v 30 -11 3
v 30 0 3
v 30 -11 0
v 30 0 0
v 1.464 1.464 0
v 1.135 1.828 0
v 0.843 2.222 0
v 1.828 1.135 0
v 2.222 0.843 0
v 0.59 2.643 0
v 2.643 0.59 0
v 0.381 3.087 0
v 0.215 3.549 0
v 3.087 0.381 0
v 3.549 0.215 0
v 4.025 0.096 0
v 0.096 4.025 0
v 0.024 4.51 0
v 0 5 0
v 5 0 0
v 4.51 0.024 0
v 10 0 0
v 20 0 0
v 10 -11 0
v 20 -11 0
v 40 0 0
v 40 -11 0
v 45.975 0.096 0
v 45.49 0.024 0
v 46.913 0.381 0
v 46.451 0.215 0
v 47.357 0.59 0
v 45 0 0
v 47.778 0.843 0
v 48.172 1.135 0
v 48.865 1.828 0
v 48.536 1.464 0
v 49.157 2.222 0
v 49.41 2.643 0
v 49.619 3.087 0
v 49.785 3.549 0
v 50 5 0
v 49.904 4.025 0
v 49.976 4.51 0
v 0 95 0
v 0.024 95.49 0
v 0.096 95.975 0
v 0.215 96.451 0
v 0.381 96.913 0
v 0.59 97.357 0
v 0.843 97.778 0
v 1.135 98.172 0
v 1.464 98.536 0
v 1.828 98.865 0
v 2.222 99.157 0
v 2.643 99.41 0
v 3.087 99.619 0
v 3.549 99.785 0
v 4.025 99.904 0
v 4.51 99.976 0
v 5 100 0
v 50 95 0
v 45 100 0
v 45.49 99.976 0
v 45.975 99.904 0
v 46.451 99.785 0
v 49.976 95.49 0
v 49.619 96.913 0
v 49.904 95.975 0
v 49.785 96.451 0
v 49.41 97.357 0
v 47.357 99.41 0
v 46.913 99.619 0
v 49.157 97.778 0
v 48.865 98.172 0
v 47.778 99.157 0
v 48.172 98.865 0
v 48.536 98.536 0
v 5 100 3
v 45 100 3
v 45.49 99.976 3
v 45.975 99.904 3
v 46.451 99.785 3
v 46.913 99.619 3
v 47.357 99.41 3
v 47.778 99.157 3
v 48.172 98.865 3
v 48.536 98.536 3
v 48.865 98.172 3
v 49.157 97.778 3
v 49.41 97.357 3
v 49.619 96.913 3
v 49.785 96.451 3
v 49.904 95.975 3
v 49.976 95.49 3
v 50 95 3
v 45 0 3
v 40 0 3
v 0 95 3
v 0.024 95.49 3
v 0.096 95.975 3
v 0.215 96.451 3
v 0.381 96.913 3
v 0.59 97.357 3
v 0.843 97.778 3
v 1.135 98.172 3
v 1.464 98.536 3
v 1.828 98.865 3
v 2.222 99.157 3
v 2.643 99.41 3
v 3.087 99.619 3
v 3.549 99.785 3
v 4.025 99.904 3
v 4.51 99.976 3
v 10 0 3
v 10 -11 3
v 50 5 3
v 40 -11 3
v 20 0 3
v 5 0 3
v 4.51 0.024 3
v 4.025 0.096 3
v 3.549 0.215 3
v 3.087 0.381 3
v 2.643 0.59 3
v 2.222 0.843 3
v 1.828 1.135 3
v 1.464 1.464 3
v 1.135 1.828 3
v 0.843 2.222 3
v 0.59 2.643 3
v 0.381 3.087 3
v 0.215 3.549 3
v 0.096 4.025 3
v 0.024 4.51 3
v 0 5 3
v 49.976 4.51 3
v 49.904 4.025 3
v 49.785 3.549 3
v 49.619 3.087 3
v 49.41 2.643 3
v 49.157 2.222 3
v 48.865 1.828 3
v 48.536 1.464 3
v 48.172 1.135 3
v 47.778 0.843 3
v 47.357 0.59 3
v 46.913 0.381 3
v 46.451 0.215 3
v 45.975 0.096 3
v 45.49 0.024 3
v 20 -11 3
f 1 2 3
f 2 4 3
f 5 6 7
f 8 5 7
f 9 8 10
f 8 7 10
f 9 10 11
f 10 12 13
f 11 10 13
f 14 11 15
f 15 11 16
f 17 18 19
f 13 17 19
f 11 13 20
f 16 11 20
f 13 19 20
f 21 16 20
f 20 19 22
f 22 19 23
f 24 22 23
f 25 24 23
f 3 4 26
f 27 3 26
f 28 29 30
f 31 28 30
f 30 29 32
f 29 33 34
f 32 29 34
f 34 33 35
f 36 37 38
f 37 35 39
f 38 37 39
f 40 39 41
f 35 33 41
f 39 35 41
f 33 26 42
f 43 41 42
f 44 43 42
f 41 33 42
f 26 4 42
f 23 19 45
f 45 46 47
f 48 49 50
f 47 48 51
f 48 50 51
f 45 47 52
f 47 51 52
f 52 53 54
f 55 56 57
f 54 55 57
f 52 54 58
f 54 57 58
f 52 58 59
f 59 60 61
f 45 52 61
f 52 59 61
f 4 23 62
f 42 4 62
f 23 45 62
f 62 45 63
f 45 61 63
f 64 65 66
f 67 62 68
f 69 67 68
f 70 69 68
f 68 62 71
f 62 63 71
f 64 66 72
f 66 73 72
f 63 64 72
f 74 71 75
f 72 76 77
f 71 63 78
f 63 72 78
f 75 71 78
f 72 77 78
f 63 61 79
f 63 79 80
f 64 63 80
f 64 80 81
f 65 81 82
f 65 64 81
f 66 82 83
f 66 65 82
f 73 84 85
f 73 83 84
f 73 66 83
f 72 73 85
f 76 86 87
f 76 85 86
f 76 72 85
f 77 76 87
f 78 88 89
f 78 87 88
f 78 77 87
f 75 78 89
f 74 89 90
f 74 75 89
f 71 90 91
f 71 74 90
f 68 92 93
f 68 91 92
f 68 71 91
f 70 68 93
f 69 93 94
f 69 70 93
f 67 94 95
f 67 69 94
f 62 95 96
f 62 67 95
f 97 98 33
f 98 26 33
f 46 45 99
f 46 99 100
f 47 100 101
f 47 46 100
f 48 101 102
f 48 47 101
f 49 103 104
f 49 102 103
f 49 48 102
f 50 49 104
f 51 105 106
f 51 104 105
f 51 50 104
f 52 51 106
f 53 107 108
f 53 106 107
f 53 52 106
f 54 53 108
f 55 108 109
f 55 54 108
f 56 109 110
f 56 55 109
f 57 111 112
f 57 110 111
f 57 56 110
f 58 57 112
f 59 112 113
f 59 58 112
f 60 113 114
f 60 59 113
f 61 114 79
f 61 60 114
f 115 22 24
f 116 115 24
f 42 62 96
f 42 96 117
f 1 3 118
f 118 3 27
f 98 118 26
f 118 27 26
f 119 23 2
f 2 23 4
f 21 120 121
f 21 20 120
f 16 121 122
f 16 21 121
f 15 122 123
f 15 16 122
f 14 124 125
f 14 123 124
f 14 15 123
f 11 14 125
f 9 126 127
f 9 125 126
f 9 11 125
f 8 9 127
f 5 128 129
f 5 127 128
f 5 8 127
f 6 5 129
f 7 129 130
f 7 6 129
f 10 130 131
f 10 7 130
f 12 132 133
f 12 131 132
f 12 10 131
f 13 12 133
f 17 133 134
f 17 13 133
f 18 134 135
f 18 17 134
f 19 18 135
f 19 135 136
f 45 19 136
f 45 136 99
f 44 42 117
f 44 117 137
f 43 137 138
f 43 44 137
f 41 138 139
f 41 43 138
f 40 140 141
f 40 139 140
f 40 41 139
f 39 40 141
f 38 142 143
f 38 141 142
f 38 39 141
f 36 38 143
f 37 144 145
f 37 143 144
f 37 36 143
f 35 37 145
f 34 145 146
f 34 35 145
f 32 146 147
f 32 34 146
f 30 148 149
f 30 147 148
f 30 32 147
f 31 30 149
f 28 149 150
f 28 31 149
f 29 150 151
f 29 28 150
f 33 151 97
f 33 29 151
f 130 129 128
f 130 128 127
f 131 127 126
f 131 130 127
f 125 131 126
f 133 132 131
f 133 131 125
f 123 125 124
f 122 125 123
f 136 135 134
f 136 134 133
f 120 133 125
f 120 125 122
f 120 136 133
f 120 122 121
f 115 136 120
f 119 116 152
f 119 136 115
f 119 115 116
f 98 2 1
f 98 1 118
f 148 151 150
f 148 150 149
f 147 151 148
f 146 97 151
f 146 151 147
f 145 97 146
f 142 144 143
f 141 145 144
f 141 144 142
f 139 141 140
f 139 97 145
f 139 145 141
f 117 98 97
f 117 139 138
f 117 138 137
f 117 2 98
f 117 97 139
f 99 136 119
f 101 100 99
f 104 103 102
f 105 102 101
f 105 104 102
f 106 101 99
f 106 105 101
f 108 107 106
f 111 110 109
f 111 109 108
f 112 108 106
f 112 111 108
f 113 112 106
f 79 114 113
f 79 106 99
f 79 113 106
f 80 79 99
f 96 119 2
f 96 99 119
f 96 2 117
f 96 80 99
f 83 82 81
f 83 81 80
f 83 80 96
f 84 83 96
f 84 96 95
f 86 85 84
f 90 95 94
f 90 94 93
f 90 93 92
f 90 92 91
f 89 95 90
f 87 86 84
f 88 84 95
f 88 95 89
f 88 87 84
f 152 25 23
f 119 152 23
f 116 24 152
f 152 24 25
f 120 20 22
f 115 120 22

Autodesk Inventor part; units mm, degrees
ref_plane "YZ Plane" through (0, 0, 0) normal (1, 0, 0) x (0, 1, 0)
ref_plane "XZ Plane" through (0, 0, 0) normal (0, 1, 0) x (-1, 0, 0)
ref_plane "XY Plane" through (0, 0, 0) normal (0, 0, 1) x (1, 0, 0)
sketch "Skizze1" plane through (0, 0, 0) normal (0, 0, 1) x (1, 0, 0)
  line L0 (0, 5) -> (0, 95)
  line L1 (5, 100) -> (45, 100)
  line L2 (50, 95) -> (50, 5)
  arc A0 (5, 100) -> (0, 95) centre (5, 95) ccw
  arc A1 (50, 95) -> (45, 100) centre (45, 95) ccw
  arc A2 (45, 0) -> (50, 5) centre (45, 5) ccw
  arc A3 (0, 5) -> (5, 0) centre (5, 5) ccw
  line L3 (10, 0) -> (10, -11)
  line L4 (10, -11) -> (20, -11)
  line L5 (20, -11) -> (20, 0)
  line L6 (30, 0) -> (30, -11)
  line L7 (30, -11) -> (40, -11)
  line L8 (40, -11) -> (40, 0)
  line L9 (5, 0) -> (10, 0)
  line L10 (20, 0) -> (30, 0)
  line L11 (40, 0) -> (45, 0)
  point P0 (0, 0)
  dimension "d1" = 50
  dimension "d3" = 5
  dimension "d4" = 11
  dimension "d5" = 10
  dimension "d6" = 100
extrude "Extrusion1" add sketch "Skizze1" along normal blind 3
properties part number "Scheibe" material "Glas"
